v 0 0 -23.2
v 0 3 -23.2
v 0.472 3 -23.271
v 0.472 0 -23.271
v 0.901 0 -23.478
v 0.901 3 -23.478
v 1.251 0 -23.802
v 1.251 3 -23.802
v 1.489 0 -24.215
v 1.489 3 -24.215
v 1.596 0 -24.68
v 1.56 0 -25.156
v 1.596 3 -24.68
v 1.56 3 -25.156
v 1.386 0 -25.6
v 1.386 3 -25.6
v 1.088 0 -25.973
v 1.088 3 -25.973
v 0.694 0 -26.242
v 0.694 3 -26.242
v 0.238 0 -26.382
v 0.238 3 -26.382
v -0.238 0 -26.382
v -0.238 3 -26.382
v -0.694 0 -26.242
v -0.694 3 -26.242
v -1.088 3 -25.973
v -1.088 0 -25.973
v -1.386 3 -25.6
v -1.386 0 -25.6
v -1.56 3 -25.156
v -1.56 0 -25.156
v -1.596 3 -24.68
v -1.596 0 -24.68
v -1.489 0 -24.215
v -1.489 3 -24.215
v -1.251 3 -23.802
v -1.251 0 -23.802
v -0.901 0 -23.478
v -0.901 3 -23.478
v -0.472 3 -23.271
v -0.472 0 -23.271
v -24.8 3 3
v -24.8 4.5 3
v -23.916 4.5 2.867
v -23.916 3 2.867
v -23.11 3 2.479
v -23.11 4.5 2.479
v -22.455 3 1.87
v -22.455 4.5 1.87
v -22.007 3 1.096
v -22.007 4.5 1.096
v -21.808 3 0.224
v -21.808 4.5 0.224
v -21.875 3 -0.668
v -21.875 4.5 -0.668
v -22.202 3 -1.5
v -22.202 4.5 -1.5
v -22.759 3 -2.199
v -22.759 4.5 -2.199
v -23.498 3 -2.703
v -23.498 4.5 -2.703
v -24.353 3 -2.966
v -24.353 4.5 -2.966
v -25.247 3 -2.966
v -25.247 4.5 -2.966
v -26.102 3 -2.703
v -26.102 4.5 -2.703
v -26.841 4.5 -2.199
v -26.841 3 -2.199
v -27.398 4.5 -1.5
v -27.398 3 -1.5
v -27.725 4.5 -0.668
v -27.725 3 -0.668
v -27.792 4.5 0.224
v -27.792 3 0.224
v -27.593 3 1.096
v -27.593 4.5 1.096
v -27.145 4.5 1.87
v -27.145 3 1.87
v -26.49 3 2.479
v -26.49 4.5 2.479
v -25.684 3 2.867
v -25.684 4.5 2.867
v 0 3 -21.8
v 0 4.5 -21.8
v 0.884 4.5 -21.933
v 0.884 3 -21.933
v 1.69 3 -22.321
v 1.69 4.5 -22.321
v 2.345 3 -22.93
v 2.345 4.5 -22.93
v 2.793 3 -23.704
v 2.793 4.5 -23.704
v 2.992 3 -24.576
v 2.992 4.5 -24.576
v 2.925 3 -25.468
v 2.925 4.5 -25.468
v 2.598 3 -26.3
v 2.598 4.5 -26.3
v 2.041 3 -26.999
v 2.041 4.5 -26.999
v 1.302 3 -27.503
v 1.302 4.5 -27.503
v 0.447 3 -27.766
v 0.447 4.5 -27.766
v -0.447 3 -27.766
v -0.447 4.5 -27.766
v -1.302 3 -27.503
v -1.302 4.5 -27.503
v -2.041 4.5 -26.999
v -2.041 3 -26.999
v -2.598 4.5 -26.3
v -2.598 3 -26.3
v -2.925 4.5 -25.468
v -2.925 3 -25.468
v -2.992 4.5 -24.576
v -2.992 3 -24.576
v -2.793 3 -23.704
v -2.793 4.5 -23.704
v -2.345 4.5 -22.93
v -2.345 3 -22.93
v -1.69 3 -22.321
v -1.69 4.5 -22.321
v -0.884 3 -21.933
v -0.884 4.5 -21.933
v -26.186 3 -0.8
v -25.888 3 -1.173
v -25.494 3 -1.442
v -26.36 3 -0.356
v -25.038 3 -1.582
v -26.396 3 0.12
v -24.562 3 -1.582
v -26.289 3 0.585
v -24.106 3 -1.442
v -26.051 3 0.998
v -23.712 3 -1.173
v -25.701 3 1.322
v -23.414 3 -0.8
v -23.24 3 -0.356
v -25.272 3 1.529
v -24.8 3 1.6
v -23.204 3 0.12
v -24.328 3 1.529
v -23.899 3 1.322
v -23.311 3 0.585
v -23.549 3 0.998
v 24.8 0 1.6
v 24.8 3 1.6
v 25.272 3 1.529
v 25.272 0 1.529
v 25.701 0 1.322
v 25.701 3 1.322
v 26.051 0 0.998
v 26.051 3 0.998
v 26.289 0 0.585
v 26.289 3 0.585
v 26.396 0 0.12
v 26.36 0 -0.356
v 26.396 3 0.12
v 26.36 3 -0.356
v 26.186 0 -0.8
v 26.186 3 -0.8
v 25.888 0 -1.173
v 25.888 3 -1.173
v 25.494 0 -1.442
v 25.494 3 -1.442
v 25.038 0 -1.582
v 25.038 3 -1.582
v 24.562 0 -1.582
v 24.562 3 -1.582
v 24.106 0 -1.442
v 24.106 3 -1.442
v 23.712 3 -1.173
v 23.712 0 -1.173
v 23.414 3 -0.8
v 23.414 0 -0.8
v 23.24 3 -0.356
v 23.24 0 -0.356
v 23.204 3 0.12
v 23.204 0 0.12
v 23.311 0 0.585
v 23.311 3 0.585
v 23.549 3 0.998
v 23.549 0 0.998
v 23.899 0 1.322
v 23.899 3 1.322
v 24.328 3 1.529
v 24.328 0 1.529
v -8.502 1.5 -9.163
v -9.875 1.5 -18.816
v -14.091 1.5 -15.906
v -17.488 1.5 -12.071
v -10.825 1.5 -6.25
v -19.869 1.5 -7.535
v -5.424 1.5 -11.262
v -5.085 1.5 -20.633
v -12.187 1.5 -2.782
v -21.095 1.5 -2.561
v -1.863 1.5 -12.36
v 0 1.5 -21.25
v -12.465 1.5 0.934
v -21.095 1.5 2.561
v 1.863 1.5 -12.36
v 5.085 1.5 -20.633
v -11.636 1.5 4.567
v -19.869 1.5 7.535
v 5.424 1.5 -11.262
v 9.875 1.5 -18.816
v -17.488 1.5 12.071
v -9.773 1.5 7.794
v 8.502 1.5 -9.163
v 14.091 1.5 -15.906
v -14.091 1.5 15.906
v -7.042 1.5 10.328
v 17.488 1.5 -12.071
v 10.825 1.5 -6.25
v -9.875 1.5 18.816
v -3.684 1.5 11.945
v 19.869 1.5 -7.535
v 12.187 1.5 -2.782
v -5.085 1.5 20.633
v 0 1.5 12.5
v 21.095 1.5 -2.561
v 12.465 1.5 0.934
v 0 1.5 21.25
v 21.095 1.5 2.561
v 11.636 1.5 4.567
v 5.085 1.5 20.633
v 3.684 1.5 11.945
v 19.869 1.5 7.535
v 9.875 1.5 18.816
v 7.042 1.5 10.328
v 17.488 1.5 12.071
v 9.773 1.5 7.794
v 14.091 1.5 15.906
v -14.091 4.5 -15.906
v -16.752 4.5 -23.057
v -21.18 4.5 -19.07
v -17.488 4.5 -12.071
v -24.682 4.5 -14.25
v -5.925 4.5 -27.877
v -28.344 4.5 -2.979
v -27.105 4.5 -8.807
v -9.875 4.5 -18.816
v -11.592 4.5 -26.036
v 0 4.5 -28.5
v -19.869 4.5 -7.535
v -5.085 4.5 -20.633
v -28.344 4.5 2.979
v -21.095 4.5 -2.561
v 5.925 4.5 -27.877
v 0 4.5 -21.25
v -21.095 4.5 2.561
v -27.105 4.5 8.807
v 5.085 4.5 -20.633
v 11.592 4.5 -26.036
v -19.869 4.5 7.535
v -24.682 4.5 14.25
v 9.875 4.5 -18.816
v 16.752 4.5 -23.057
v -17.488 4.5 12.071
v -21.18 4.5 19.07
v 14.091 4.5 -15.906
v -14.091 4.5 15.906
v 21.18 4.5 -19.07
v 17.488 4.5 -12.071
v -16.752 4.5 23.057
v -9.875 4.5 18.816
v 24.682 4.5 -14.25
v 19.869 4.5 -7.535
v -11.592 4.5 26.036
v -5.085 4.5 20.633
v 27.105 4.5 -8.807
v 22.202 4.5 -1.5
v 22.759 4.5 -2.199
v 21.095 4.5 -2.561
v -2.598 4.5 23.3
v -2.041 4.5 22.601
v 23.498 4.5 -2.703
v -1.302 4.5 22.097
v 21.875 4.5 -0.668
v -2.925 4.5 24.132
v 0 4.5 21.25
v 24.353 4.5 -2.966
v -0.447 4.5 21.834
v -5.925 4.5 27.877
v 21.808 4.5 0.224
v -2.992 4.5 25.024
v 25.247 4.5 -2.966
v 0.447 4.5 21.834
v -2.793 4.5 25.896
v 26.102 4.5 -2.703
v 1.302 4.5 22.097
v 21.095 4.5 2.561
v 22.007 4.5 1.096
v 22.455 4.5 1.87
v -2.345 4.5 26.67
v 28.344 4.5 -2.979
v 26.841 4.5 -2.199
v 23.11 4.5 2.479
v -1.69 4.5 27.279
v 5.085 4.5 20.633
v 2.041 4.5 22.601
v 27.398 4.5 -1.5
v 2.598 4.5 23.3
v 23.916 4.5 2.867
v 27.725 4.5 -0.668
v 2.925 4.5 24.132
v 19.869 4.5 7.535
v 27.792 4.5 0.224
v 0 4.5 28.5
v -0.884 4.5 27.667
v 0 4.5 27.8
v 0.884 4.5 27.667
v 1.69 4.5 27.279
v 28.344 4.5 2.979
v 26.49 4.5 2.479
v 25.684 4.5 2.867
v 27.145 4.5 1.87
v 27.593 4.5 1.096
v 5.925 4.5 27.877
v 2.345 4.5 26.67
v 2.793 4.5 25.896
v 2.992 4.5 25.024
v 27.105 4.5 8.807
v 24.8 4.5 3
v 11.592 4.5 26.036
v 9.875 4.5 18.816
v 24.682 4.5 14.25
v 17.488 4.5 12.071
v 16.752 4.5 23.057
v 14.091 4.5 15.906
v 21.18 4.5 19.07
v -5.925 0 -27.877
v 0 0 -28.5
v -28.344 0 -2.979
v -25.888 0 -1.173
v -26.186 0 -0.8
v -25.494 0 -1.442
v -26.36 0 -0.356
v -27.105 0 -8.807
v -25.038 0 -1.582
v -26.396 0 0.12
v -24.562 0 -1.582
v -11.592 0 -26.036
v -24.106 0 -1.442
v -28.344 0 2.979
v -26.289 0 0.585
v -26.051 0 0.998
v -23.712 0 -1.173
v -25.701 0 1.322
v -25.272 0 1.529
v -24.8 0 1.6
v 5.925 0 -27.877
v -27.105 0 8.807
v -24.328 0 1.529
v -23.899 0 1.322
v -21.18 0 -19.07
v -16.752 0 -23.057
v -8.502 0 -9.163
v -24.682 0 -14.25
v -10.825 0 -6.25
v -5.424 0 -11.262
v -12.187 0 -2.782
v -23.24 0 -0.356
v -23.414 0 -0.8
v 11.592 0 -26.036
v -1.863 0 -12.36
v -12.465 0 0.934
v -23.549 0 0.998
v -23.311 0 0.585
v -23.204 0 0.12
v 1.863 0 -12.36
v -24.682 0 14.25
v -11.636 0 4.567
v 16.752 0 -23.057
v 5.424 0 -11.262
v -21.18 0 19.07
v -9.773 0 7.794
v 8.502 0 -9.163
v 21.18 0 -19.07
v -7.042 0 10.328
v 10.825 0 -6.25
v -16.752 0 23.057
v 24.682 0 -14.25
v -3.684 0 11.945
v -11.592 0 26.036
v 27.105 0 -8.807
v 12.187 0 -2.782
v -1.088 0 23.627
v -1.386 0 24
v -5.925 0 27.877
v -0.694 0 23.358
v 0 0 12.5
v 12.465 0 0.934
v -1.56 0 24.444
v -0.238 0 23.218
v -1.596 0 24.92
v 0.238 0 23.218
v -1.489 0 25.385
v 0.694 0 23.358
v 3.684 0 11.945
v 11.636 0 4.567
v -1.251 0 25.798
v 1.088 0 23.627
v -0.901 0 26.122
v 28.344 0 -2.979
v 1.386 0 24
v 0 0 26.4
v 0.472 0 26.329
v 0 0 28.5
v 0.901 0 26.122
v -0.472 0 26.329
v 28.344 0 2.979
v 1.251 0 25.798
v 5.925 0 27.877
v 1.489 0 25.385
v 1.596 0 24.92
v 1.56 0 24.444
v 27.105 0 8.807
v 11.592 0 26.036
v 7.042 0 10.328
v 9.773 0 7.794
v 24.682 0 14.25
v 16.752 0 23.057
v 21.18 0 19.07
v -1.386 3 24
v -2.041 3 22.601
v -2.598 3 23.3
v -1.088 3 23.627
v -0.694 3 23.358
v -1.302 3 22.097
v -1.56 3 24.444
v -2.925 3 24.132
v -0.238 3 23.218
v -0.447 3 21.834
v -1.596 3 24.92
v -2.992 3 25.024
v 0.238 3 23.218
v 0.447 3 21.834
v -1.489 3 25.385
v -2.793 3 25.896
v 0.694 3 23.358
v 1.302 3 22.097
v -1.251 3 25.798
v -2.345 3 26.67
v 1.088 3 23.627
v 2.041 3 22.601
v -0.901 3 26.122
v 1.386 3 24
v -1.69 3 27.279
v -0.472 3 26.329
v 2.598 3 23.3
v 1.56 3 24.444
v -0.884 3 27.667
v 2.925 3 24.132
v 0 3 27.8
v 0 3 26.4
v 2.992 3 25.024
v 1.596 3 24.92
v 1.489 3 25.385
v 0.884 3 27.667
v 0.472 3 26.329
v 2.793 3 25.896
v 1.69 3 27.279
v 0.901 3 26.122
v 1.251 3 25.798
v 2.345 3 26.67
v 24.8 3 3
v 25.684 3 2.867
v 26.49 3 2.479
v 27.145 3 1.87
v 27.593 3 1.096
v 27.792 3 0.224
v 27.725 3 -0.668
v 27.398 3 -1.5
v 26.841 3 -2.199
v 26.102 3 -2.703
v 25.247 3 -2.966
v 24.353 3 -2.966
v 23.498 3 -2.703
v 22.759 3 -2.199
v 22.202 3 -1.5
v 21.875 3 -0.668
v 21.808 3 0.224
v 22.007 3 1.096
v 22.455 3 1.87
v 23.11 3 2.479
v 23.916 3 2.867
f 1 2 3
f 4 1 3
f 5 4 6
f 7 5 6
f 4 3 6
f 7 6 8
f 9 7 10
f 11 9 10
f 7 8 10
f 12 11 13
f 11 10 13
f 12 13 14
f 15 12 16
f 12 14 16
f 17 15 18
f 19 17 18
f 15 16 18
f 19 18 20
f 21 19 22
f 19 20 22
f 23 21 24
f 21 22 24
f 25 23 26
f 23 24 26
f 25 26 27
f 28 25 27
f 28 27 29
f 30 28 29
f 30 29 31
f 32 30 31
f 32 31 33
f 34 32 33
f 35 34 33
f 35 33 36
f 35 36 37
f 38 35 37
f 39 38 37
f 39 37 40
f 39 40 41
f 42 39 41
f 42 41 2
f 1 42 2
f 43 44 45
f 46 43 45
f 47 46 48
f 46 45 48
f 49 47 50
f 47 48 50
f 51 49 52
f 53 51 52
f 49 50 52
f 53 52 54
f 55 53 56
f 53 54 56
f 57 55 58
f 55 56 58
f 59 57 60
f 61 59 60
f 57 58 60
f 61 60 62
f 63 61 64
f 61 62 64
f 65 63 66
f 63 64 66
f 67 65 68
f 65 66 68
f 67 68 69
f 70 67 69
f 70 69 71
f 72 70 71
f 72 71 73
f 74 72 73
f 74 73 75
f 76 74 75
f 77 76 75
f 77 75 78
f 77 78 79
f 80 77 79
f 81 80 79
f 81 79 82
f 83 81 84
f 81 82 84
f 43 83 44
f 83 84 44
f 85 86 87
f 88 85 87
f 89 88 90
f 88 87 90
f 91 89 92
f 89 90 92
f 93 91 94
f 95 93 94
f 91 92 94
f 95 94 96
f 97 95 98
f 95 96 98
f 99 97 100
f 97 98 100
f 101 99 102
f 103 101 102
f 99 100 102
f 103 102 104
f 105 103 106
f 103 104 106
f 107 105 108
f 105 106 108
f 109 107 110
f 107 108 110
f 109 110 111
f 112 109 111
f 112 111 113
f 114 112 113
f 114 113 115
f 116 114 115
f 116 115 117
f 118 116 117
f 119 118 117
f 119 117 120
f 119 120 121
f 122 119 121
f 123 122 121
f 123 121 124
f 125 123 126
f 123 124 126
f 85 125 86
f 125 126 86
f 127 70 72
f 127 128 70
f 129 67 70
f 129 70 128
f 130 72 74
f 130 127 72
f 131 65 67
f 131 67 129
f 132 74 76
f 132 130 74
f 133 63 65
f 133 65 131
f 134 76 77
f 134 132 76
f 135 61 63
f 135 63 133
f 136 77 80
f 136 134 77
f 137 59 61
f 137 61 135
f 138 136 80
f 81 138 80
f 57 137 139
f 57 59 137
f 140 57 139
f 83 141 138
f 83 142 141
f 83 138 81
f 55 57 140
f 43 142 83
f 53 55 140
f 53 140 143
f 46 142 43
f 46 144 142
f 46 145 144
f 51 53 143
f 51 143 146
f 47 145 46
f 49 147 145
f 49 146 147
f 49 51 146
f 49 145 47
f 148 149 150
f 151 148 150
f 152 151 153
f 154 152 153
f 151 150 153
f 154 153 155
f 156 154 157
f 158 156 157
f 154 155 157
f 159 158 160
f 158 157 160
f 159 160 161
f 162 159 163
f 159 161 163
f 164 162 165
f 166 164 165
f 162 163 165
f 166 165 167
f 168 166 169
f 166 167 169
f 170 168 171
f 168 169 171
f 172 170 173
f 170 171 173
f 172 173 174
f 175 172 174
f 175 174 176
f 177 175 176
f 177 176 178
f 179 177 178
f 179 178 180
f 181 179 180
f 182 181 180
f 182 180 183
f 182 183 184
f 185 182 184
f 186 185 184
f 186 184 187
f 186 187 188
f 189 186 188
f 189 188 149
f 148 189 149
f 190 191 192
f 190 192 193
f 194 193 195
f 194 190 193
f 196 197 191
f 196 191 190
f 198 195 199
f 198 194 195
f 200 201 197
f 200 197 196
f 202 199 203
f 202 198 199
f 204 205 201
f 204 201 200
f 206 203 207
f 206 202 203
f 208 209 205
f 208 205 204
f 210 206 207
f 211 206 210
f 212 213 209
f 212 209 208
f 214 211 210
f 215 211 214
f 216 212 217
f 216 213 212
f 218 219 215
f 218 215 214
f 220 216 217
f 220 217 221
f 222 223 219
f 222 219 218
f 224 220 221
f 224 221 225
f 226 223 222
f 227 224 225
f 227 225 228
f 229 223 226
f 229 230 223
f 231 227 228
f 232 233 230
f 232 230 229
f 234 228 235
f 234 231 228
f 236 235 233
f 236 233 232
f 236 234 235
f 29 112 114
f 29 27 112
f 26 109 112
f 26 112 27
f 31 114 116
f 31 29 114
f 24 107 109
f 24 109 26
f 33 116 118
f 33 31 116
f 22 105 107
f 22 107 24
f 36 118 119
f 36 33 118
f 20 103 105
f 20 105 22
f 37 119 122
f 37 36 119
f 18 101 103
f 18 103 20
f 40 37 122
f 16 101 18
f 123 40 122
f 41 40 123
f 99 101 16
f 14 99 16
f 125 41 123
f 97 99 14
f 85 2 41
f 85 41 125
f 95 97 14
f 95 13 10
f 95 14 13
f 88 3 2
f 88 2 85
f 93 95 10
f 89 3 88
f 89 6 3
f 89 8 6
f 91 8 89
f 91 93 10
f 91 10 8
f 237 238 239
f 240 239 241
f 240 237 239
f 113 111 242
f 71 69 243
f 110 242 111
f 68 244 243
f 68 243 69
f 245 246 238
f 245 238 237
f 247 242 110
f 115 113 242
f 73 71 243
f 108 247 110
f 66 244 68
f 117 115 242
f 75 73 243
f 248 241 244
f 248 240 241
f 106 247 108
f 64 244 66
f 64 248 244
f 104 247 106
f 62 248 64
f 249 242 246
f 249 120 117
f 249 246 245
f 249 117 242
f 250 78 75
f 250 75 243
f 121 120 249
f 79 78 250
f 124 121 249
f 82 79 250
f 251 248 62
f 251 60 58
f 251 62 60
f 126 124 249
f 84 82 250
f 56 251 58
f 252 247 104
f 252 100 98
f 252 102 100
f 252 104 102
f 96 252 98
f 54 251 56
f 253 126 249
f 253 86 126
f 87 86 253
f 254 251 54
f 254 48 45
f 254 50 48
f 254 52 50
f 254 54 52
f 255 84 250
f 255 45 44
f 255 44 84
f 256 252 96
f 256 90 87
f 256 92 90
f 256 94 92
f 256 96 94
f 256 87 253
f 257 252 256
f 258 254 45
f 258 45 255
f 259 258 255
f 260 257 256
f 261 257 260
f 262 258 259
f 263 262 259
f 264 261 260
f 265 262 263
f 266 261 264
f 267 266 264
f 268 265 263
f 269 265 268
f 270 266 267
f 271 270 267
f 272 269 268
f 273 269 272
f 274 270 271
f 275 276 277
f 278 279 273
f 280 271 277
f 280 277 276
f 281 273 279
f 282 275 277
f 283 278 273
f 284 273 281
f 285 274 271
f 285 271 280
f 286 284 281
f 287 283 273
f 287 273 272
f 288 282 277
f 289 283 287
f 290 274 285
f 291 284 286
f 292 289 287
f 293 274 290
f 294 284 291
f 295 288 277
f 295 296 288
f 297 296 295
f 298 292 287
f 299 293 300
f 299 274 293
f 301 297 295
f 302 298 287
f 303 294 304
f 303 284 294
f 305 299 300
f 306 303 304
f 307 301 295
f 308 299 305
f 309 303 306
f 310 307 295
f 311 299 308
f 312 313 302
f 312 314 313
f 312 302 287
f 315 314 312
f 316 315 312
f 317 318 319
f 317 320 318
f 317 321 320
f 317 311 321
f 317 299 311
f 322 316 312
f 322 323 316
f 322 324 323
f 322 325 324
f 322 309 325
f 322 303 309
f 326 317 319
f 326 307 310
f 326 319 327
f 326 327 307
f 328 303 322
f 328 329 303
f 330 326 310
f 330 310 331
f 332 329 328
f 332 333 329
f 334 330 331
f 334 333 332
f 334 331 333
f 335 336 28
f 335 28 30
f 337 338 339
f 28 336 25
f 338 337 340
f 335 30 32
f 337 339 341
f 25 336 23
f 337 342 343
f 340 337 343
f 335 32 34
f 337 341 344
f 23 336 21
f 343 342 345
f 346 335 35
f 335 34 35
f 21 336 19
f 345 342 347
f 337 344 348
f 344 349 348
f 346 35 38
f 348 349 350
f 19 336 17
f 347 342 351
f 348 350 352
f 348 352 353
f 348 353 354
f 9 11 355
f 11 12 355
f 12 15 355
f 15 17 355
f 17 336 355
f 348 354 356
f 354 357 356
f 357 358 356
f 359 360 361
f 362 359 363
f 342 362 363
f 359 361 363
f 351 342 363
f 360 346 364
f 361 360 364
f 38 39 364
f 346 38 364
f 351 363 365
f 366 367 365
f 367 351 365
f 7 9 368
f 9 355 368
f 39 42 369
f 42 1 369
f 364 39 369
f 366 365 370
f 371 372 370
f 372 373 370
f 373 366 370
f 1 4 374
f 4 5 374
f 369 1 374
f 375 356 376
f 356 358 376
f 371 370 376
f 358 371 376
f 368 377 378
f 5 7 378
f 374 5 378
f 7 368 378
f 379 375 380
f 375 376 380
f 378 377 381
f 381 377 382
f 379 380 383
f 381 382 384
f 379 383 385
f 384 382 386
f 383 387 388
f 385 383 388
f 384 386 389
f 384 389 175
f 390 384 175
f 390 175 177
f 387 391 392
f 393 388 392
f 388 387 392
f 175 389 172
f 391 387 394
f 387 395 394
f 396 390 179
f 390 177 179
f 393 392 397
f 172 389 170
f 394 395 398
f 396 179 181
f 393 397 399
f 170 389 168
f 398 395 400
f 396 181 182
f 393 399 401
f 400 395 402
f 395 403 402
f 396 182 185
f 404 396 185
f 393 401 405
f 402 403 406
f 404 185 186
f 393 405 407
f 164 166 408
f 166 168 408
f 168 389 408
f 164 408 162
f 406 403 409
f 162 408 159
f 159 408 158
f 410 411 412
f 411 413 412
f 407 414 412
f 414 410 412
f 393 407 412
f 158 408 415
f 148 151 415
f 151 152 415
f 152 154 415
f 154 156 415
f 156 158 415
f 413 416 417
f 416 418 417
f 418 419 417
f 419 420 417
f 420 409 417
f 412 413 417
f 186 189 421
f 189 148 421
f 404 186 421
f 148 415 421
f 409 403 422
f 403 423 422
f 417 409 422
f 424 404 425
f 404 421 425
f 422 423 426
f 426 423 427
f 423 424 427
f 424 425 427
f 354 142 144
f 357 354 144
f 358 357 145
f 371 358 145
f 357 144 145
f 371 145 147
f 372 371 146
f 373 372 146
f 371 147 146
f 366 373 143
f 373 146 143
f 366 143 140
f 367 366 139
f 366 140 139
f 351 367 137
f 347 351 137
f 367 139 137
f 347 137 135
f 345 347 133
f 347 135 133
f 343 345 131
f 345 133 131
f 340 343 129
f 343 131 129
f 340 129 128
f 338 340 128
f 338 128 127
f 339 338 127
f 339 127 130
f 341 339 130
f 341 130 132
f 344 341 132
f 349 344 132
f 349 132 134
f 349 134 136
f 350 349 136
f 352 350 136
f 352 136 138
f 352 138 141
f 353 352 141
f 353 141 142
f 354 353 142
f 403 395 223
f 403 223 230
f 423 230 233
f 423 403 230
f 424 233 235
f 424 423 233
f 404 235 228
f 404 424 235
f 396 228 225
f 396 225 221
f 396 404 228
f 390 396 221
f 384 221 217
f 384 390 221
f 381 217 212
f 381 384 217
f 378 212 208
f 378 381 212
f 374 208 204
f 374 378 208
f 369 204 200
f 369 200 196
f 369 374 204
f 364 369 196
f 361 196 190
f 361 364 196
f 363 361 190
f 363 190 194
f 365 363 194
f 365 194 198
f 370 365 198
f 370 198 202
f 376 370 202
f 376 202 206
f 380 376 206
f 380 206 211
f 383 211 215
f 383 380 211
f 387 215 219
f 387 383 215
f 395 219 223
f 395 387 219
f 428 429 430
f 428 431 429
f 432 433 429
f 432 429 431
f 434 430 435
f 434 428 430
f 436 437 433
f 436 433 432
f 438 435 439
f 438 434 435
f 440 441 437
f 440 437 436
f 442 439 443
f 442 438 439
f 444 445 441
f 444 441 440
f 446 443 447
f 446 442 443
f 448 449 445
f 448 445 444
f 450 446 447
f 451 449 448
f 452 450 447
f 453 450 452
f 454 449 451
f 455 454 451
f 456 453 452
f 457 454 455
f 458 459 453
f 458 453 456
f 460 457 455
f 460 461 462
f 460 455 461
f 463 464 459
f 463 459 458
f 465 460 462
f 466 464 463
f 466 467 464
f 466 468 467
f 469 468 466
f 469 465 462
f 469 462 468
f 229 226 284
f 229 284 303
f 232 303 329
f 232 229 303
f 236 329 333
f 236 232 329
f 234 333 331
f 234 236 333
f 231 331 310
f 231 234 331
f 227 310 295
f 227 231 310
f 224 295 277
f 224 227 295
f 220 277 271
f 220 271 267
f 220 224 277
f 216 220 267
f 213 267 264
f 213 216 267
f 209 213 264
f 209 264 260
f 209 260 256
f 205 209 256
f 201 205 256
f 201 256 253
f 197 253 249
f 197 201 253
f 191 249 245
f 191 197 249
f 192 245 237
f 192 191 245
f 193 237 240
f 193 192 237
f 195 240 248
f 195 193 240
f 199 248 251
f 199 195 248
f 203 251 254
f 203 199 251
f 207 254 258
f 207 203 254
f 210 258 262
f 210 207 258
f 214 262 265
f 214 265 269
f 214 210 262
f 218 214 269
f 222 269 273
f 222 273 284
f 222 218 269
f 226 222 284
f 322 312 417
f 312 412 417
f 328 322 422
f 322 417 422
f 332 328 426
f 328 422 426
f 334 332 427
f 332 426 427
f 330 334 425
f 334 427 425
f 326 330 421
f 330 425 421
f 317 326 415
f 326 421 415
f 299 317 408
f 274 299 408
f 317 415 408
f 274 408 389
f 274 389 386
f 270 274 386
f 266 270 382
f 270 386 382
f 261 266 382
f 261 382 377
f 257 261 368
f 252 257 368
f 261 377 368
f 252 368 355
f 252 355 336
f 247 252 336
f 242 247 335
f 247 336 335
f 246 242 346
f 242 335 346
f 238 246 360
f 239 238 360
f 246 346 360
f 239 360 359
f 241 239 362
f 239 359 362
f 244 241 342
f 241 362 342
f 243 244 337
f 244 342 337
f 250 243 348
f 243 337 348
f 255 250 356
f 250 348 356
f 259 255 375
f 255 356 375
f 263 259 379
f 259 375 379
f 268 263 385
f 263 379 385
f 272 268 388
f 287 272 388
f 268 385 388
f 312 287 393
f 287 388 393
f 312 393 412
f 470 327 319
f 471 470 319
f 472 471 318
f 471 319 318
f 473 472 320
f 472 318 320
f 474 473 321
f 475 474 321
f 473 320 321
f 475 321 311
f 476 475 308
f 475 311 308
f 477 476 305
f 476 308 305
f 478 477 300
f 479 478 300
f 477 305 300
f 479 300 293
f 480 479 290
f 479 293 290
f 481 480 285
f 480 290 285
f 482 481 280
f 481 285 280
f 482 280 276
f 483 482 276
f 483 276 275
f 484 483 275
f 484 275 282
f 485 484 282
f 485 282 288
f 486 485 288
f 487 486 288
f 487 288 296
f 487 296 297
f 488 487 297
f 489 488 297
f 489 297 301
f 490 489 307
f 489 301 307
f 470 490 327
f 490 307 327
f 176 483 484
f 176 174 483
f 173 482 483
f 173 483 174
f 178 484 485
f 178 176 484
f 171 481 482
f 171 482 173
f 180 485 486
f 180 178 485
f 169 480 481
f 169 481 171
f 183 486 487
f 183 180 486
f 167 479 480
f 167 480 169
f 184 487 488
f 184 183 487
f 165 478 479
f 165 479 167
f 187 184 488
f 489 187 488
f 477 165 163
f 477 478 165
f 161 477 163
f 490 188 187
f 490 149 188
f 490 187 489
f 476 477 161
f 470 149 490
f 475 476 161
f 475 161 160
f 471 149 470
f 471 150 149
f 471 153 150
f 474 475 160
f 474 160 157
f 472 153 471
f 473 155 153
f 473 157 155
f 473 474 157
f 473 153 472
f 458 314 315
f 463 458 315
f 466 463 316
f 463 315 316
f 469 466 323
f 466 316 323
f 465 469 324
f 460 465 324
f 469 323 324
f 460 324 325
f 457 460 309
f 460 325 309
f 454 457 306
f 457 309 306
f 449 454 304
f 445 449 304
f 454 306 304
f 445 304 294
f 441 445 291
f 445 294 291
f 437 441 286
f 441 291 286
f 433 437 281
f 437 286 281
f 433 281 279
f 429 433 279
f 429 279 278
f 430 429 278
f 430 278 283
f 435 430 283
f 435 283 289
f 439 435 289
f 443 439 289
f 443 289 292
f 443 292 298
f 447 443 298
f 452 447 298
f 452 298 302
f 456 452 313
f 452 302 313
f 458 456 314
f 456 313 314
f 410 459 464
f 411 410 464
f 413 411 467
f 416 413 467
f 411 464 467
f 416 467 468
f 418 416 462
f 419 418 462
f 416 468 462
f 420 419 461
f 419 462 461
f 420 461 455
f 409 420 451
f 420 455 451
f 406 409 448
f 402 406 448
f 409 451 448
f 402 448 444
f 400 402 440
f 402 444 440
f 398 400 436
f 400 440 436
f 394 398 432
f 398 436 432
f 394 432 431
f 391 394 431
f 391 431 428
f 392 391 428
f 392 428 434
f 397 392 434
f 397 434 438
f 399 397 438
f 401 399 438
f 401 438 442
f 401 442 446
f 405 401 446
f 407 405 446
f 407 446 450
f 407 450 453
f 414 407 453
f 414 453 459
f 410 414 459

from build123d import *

# Parameters (mm, degrees)
SKETCH_1_R          = 28.5
SKETCH_1_R_2        = 12.5
EXTRUDE_1_DEPTH     = 1.5
SKETCH_2_R          = 28.5
SKETCH_2_R_2        = 21.25
EXTRUDE_2_DEPTH     = 3
SKETCH_3_R          = 3
CUT_EXTRUDE_1_DEPTH = 1.5
SKETCH_4_R          = 1.6
CUT_EXTRUDE_2_DEPTH = 41.416580756


with BuildPart() as part:
    # 草图1 → 凸台-拉伸1 (new body)
    with BuildSketch(Plane(origin=(0, 0, 0), x_dir=(1, 0, 0), z_dir=(0, 1, 0))):
        with Locations(Location((0, 0, 0), (0, 0, 270))):
            Circle(SKETCH_1_R)
        with Locations(Location((0, 0, 0), (0, 0, 270))):
            Circle(SKETCH_1_R_2, mode=Mode.SUBTRACT)
    extrude(amount=EXTRUDE_1_DEPTH)

    # 草图2 → 凸台-拉伸2 (add)
    with BuildSketch(Plane(origin=(0, 1.5, 0), x_dir=(1, 0, 0), z_dir=(0, 1, 0))):
        with Locations(Location((0, 0, 0), (0, 0, 270))):
            Circle(SKETCH_2_R)
        with Locations(Location((0, 0, 0), (0, 0, 270))):
            Circle(SKETCH_2_R_2, mode=Mode.SUBTRACT)
    extrude(amount=EXTRUDE_2_DEPTH)

    # 草图3 → 切除-拉伸1 (cut)
    with BuildSketch(Plane(origin=(0, 4.5, 0), x_dir=(1, 0, 0), z_dir=(0, 1, 0))):
        with Locations(Location((0, 24.8, 0), (0, 0, 270))):
            Circle(SKETCH_3_R)
        with Locations(Location((24.8, 0, 0), (0, 0, 270))):
            Circle(SKETCH_3_R)
        with Locations(Location((0, -24.8, 0), (0, 0, 270))):
            Circle(SKETCH_3_R)
        with Locations(Location((-24.8, 0, 0), (0, 0, 270))):
            Circle(SKETCH_3_R)
    extrude(amount=-CUT_EXTRUDE_1_DEPTH, mode=Mode.SUBTRACT)

    # 草图4 → 切除-拉伸2 (cut, through all)
    with BuildSketch(Plane(origin=(0, 3, 0), x_dir=(1, 0, 0), z_dir=(0, 1, 0))):
        with Locations(Location((0, 24.8, 0), (0, 0, 270))):
            Circle(SKETCH_4_R)
        with Locations(Location((24.8, 0, 0), (0, 0, 270))):
            Circle(SKETCH_4_R)
        with Locations(Location((0, -24.8, 0), (0, 0, 270))):
            Circle(SKETCH_4_R)
        with Locations(Location((-24.8, 0, 0), (0, 0, 270))):
            Circle(SKETCH_4_R)
    extrude(amount=-CUT_EXTRUDE_2_DEPTH, mode=Mode.SUBTRACT)


solid = part.part
